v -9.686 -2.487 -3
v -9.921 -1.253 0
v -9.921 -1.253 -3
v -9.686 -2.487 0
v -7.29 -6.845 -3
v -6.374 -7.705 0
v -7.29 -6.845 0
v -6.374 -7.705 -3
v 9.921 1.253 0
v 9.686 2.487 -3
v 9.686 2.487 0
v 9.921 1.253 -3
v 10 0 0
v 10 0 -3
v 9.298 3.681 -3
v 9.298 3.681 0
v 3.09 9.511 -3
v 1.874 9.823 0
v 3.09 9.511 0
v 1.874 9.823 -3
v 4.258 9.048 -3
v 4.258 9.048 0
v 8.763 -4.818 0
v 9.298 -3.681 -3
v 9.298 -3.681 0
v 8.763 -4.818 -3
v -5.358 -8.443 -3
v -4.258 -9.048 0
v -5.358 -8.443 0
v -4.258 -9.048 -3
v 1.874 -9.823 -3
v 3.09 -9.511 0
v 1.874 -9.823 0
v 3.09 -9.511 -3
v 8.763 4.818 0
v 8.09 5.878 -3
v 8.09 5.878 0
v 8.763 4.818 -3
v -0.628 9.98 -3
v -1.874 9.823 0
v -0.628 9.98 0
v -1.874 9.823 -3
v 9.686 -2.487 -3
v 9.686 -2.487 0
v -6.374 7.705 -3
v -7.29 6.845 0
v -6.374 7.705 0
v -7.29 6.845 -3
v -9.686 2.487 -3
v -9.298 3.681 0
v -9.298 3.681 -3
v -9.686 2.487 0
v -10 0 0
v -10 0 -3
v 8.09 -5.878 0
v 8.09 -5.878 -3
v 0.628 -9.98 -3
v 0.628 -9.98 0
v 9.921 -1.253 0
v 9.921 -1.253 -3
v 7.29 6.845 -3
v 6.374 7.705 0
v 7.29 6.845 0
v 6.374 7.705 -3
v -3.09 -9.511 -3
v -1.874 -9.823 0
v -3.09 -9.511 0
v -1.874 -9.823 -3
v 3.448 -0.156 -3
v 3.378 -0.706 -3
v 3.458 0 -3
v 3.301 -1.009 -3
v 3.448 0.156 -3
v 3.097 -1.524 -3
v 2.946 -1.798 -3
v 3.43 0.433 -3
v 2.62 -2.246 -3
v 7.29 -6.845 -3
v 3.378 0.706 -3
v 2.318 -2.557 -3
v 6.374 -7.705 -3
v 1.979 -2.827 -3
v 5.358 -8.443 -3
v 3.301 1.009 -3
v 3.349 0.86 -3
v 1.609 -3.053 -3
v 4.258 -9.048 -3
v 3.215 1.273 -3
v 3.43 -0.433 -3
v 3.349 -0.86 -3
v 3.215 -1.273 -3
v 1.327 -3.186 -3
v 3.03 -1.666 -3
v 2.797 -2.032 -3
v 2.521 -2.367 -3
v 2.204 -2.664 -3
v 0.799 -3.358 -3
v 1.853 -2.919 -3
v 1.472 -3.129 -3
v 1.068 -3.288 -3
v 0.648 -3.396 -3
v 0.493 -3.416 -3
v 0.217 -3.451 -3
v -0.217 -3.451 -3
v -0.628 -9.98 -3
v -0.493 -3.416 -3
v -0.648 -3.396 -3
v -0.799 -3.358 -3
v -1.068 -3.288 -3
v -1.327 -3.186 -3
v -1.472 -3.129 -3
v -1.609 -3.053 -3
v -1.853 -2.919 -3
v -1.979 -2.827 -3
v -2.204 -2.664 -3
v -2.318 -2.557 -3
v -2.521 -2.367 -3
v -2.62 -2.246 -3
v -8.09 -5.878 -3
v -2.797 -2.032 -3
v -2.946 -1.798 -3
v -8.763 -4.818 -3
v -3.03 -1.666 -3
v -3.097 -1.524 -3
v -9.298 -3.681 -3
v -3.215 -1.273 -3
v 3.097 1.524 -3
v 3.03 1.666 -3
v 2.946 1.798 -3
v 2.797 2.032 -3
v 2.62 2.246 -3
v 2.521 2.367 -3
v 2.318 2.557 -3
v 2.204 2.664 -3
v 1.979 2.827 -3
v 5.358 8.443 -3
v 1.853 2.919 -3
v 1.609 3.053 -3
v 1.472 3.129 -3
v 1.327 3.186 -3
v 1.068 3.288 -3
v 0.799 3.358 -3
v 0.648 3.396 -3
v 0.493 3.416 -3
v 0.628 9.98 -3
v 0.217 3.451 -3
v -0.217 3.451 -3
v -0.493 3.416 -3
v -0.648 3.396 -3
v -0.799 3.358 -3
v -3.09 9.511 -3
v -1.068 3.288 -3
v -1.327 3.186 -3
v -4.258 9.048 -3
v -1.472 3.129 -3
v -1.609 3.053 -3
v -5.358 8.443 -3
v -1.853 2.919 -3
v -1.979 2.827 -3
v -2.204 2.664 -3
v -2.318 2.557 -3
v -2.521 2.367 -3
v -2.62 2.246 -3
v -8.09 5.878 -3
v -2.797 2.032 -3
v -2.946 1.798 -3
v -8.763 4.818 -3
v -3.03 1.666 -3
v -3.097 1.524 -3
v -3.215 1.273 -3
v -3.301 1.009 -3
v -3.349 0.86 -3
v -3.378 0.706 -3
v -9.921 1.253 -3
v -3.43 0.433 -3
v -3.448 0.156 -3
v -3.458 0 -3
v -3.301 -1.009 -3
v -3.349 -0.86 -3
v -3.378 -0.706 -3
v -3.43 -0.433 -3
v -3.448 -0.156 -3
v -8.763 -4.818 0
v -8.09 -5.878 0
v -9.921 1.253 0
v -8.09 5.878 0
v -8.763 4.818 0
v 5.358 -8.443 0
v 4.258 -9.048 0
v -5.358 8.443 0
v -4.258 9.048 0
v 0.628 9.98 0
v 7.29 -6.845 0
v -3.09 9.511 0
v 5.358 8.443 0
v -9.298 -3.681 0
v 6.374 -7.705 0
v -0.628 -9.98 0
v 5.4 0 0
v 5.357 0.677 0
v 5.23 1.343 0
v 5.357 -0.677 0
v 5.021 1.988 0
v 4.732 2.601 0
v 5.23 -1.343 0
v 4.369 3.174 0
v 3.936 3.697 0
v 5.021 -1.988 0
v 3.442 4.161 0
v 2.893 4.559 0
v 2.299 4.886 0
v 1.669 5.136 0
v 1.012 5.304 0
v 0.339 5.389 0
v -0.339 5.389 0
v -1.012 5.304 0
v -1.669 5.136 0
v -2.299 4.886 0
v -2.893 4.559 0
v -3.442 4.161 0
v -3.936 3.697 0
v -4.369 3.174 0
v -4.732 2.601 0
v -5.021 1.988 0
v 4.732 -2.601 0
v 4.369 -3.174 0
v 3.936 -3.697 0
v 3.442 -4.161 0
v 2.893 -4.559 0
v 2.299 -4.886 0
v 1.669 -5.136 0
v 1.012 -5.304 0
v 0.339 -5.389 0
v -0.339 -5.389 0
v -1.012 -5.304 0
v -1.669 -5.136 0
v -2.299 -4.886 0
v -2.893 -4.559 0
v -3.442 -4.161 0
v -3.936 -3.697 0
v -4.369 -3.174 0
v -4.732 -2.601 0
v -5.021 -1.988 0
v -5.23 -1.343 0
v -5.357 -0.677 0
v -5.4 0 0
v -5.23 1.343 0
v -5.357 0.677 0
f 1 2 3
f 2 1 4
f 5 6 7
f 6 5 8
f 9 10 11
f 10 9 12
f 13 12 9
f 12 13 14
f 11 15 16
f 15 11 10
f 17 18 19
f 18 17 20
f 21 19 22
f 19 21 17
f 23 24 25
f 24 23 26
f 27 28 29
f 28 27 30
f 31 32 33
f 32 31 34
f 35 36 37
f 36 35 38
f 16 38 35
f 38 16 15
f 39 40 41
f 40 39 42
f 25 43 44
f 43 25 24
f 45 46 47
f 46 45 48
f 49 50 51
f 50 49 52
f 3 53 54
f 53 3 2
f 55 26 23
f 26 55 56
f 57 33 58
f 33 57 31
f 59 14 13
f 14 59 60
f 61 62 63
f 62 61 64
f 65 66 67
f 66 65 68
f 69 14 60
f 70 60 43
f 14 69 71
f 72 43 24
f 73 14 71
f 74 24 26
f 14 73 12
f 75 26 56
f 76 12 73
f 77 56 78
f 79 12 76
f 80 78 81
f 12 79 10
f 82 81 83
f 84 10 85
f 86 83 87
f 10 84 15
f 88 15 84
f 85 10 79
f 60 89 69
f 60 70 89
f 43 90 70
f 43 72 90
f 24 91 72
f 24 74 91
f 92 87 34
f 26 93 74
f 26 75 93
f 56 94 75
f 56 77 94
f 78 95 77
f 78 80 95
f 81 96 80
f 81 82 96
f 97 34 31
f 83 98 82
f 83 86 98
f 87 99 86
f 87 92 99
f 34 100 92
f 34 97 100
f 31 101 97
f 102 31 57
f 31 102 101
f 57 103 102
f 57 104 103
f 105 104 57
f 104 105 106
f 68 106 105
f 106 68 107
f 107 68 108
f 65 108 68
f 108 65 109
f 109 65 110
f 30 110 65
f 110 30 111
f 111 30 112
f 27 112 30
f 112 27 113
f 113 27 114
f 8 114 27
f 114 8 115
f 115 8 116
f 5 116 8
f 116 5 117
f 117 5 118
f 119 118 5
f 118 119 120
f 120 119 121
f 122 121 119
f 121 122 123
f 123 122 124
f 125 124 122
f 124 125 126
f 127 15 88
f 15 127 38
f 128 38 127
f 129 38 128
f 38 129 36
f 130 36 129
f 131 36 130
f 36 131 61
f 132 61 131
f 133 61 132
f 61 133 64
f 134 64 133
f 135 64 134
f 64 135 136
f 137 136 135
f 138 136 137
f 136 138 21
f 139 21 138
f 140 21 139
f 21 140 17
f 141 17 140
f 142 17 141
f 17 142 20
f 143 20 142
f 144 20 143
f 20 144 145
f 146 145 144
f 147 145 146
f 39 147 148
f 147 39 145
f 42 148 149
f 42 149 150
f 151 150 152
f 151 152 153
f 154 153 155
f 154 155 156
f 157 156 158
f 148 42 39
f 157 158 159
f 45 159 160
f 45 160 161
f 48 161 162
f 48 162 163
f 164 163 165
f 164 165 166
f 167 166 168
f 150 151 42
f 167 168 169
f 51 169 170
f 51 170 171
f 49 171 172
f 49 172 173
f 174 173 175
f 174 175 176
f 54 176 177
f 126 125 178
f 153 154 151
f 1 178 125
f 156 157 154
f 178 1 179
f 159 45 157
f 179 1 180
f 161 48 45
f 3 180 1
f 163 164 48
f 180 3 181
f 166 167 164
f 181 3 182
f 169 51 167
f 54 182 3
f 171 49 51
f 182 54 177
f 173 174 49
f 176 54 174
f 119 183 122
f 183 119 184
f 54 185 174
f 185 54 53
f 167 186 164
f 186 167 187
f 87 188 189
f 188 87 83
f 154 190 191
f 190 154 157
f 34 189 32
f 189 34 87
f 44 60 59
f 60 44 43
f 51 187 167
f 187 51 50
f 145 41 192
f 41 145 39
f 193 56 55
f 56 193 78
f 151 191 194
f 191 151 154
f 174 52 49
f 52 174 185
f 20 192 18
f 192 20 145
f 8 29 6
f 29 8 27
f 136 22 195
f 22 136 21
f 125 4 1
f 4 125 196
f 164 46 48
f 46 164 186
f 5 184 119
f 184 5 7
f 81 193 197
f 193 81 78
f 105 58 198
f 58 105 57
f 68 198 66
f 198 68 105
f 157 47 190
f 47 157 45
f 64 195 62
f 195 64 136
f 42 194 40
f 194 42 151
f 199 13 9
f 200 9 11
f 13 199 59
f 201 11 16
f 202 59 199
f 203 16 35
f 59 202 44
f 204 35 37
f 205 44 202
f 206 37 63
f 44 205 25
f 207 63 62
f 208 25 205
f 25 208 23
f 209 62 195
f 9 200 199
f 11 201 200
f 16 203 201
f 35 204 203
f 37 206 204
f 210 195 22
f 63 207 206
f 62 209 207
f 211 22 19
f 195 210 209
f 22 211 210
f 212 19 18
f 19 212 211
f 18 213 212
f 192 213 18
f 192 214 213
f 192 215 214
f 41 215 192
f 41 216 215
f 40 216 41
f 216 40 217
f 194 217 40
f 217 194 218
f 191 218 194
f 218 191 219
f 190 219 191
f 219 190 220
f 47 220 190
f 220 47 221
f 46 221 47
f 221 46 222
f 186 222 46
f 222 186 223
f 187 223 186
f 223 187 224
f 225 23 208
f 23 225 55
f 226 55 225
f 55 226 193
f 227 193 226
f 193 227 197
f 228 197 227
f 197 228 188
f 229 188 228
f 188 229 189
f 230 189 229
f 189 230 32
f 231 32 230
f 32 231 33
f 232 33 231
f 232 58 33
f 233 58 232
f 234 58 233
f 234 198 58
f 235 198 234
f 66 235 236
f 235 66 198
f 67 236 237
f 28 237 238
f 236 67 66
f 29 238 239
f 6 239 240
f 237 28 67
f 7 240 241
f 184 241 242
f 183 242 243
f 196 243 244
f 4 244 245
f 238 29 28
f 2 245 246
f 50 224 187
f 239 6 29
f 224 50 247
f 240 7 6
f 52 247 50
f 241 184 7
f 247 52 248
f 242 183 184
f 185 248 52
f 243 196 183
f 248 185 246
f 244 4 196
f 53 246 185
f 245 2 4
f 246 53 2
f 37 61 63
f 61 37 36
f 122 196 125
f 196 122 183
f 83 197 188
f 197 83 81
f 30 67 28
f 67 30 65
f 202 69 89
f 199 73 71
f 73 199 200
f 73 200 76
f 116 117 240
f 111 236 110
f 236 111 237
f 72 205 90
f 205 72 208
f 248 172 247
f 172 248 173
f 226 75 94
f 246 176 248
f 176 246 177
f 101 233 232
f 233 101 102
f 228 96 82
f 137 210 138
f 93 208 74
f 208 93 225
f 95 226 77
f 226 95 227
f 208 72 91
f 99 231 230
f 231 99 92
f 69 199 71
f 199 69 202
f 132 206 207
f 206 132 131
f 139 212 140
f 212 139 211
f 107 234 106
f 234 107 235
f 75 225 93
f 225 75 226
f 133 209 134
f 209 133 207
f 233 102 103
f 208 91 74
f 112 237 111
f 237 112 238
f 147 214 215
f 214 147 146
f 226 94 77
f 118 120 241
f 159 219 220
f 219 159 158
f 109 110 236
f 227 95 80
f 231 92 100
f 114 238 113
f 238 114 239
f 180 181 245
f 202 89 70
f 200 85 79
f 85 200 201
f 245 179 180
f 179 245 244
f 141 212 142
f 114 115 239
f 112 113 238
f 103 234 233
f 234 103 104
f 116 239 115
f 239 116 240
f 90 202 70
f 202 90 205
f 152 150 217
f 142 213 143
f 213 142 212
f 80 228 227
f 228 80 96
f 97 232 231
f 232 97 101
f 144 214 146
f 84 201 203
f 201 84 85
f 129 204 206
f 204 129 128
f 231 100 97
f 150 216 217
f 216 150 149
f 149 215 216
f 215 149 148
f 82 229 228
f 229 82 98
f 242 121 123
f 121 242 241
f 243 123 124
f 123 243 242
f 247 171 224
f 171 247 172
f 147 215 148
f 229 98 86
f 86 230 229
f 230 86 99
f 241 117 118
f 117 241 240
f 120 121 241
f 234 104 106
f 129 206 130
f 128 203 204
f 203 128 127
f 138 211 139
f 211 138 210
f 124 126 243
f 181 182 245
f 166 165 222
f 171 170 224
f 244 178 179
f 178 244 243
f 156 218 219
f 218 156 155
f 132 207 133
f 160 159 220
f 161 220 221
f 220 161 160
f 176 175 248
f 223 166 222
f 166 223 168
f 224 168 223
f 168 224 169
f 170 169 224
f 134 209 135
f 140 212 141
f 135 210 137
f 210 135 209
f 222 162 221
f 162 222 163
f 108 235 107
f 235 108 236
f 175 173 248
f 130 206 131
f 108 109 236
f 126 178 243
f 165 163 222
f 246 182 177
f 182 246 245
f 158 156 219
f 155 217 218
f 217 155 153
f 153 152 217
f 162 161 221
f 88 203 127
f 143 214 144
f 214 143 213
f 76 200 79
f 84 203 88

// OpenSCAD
$fn = 50;

difference() {
	union() {
		translate(v = [0, 0, -3.0]) {
			cylinder(h = 3, r = 10.0);
		}
		#translate(v = [0, 0, -6.0]) {
			cylinder(h = 6, r = 2.875);
		}
	}
	union() {
		translate(v = [0, 0, 0]) {
			rotate(a = [0, 0, 0]) {
				difference() {
					union() {
						translate(v = [0, 0, -6.0]) {
							cylinder(h = 6, r = 2.6);
						}
						translate(v = [0, 0, -3.9]) {
							cylinder(h = 3.9, r1 = 2.875, r2 = 5.4);
						}
						translate(v = [0, 0, -6.0]) {
							cylinder(h = 6, r = 2.875);
						}
						translate(v = [0, 0, -6.0]) {
							cylinder(h = 6, r = 2.6);
						}
					}
					union();
				}
			}
		}
	}
}
